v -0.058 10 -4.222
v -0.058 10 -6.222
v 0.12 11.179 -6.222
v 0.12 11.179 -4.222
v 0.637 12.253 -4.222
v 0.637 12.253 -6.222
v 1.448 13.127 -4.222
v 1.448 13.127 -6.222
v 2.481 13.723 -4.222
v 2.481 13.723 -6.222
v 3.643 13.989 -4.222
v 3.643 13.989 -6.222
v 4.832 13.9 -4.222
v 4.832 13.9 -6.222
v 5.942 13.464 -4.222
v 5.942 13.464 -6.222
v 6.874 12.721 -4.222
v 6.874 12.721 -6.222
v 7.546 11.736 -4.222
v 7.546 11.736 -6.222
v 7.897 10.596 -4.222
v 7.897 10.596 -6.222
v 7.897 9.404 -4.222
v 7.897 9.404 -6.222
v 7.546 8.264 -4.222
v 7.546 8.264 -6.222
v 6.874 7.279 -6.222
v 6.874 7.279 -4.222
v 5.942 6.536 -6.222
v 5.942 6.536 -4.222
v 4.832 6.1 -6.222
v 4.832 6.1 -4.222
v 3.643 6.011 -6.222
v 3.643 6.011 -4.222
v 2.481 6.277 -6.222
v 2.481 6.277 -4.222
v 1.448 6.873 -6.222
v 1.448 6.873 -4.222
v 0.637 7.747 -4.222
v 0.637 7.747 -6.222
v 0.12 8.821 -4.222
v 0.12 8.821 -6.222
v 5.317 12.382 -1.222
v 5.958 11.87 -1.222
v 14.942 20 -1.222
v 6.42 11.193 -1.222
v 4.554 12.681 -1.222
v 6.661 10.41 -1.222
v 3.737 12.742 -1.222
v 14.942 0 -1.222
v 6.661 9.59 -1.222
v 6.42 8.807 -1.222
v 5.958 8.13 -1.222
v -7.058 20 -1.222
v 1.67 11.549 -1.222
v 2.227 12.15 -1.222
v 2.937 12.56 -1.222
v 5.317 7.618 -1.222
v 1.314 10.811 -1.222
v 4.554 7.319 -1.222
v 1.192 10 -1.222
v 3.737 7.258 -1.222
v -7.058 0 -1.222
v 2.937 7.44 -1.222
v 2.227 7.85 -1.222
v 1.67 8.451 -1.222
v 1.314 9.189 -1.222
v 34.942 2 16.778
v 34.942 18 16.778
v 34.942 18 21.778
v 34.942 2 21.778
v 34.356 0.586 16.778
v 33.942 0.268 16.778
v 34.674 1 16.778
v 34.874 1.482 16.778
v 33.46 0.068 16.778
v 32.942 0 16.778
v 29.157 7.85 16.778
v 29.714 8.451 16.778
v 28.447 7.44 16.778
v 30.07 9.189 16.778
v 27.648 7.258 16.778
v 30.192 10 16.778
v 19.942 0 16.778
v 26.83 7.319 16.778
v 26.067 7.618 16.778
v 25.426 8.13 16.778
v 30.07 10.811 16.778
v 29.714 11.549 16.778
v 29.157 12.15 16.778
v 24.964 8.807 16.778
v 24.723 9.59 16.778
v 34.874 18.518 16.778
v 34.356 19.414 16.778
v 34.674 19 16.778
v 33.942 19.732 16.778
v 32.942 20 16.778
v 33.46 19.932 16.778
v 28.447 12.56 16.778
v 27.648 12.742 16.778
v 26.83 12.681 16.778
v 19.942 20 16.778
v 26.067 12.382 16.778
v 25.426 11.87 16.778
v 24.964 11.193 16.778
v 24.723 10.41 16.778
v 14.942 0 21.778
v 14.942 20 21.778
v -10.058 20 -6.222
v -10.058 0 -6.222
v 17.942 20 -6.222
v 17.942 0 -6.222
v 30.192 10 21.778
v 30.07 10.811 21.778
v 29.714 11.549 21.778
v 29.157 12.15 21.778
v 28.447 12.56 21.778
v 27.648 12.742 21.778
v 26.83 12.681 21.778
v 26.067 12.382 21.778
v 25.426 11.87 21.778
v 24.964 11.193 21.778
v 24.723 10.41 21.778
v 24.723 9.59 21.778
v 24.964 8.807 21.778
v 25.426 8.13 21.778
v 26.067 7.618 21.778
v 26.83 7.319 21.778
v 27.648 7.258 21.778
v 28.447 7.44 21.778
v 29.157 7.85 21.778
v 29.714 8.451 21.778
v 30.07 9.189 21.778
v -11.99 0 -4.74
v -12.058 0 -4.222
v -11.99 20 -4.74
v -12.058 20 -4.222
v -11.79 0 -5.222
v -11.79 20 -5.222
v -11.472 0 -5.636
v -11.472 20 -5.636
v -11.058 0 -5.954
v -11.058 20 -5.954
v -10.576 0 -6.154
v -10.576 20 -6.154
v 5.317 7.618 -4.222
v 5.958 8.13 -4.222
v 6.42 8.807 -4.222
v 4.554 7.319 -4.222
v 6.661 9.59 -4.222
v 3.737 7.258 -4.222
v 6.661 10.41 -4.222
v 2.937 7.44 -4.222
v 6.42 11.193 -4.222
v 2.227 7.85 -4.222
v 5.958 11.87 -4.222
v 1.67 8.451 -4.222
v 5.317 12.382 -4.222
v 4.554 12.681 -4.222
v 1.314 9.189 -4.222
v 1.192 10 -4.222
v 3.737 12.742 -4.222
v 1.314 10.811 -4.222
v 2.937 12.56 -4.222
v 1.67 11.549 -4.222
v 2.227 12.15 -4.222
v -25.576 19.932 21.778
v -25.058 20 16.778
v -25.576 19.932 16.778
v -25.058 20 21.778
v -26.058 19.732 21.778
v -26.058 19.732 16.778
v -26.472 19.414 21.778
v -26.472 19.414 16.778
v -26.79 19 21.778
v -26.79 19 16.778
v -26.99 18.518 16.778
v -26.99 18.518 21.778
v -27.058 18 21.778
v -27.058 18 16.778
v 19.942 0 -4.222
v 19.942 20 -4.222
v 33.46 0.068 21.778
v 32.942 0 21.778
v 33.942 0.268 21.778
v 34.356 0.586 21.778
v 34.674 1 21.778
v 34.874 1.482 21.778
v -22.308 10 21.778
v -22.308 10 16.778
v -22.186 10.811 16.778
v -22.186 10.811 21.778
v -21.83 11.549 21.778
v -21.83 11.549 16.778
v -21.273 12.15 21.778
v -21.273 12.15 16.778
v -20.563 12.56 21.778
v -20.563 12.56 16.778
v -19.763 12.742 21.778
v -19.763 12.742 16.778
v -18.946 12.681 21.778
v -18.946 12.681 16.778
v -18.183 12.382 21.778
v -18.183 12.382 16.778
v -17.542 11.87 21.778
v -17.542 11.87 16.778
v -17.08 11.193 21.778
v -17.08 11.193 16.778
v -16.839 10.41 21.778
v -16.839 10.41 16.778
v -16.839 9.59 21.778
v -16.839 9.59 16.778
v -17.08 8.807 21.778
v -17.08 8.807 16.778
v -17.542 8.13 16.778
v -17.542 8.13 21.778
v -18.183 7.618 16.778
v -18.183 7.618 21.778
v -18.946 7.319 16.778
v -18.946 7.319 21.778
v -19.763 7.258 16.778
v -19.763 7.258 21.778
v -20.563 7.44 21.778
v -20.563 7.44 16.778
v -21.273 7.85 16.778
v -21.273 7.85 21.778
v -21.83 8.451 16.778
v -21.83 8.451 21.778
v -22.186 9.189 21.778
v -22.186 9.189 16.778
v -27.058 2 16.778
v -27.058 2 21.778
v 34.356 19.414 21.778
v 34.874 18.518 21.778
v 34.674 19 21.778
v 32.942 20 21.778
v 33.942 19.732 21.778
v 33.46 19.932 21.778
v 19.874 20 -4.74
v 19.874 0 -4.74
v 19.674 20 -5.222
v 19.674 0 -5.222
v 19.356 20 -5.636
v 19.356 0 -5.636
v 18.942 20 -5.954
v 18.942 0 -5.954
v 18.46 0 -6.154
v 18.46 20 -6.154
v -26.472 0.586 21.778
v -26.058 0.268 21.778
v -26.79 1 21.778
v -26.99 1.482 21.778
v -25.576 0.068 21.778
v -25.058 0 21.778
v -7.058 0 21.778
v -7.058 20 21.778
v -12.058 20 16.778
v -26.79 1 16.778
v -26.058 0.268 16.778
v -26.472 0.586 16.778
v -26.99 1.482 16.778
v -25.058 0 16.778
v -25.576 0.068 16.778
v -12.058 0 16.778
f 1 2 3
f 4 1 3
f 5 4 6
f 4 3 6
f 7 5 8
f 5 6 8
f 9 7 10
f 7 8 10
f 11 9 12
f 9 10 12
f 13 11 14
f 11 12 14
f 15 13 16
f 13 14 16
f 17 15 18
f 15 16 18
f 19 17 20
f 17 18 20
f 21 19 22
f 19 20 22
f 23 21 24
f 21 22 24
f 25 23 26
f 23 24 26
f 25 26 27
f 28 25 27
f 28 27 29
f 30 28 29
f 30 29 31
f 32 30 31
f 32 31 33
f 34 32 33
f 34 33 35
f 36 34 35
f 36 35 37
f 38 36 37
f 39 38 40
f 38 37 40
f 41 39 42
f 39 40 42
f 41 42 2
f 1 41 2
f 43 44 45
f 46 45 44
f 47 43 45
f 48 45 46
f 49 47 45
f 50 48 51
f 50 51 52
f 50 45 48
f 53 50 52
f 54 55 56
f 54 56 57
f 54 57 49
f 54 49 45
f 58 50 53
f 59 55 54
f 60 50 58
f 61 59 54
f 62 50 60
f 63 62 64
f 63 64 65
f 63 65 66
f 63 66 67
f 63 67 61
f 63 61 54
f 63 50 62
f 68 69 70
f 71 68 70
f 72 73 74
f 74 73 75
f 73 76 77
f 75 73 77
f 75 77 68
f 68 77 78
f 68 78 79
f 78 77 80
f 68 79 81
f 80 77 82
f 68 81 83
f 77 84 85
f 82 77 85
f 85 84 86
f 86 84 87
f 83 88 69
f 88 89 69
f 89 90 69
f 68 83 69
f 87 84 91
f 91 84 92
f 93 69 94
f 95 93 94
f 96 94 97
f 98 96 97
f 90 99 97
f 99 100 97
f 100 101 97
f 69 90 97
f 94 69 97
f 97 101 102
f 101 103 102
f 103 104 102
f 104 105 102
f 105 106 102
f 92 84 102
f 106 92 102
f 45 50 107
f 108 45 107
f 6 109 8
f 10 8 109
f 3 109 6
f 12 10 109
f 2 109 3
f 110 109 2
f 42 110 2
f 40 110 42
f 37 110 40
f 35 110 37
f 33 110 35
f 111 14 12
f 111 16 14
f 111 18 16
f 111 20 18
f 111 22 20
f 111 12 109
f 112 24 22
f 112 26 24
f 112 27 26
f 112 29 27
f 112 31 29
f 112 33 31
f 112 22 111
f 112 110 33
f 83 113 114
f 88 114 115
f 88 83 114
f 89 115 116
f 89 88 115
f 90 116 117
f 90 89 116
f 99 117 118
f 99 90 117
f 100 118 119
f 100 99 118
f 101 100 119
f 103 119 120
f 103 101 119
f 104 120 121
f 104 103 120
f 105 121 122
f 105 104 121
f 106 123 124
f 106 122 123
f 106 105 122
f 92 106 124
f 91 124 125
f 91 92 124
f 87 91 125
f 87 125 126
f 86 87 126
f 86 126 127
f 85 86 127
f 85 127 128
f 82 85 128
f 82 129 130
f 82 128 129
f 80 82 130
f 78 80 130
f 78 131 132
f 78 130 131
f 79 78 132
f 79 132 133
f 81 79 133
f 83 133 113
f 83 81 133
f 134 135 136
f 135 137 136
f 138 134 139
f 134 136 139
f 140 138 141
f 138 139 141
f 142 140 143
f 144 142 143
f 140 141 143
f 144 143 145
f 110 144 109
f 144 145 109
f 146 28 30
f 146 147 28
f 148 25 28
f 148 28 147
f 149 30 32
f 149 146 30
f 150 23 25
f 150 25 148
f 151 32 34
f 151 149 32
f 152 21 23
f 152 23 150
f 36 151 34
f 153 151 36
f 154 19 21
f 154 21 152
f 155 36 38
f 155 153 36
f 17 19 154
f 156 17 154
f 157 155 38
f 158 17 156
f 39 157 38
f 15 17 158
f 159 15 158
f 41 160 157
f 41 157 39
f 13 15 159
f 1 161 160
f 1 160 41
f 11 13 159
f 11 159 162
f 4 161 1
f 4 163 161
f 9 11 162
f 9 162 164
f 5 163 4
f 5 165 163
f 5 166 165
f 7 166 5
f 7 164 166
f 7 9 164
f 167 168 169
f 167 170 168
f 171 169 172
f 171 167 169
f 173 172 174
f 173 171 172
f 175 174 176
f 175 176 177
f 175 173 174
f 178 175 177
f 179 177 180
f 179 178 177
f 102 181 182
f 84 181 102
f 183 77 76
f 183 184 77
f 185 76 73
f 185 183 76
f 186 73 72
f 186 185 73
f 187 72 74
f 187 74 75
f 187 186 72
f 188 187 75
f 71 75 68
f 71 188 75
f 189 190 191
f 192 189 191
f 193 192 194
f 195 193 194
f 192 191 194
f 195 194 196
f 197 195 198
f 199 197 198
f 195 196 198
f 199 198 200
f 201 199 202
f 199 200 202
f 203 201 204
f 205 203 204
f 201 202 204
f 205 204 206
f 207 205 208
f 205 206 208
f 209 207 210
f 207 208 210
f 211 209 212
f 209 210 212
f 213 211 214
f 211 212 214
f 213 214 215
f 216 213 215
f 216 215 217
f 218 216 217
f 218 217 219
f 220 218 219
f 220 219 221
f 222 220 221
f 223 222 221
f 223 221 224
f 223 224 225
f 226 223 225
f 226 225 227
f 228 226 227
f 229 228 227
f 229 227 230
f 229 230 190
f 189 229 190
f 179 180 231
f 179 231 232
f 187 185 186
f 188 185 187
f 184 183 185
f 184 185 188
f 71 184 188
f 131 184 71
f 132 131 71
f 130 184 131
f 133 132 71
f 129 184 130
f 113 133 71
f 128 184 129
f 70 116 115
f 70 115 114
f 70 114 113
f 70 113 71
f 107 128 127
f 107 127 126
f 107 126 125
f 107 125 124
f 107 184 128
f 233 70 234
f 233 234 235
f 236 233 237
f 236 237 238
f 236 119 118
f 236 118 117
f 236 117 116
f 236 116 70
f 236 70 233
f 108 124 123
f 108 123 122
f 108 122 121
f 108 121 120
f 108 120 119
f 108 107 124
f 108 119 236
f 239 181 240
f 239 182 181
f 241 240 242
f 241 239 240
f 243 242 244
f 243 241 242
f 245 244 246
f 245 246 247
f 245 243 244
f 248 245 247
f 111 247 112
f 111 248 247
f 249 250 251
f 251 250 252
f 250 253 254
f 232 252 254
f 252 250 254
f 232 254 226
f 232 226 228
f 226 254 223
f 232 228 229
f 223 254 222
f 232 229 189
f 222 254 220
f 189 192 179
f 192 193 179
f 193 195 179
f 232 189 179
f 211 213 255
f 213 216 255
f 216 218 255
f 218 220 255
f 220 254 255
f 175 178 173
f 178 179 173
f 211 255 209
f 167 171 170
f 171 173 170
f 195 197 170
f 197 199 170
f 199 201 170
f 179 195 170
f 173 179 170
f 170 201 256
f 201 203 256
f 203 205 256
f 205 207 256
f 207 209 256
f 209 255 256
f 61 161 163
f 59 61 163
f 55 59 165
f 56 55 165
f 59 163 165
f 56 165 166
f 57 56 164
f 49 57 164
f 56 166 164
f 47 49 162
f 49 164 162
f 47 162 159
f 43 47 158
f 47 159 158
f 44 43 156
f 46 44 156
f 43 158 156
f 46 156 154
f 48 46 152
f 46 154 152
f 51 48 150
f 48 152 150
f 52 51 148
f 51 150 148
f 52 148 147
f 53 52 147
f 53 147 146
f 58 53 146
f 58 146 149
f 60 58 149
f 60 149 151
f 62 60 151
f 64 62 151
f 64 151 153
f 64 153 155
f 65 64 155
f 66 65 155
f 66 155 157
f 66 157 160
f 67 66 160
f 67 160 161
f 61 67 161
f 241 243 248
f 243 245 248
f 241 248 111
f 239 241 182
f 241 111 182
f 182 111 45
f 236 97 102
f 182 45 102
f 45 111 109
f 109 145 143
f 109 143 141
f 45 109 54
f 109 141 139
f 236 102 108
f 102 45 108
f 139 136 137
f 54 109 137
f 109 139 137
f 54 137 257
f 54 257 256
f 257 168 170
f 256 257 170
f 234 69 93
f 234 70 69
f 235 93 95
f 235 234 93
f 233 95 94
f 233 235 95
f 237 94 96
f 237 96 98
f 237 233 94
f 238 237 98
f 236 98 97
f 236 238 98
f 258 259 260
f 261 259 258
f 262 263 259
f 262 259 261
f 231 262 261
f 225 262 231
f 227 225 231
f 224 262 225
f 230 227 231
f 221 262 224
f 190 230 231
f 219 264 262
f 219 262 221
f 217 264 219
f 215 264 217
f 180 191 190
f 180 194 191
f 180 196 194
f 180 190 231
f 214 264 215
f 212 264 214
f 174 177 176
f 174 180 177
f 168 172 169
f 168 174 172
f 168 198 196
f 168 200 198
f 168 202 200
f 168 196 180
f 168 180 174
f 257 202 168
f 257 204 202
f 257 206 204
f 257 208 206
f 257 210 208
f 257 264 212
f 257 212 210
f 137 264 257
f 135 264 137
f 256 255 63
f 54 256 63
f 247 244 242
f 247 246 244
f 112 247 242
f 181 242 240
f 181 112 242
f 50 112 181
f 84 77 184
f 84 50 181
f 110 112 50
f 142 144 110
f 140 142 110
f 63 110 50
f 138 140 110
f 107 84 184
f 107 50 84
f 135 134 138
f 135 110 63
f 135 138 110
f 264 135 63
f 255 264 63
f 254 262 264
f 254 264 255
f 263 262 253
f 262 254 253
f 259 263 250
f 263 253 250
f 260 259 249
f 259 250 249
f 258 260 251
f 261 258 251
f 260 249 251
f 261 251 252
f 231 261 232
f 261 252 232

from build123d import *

# Parameters (mm, degrees)
EXTRUDE_1_DEPTH     = 20
SKETCH_2_R          = 2.75
CUT_EXTRUDE_1_DEPTH = 40.770397535
SKETCH_3_W          = 5
SKETCH_3_H          = 20
EXTRUDE_2_DEPTH     = 15
SKETCH_4_R          = 2.75
CUT_EXTRUDE_2_DEPTH = 41.757009157
FILLET_1_R          = 2
SKETCH_5_R          = 4
CUT_EXTRUDE_3_DEPTH = 2


with BuildPart() as part:
    # 草图1 → 凸台-拉伸1 (new body)
    with BuildSketch(Plane(origin=(0, 0, 0), x_dir=(1, 0, 0), z_dir=(0, 1, 0))):
        Polygon((-12.057971014, 6.222222222), (19.942028986, 6.222222222), (19.942028986, -21.777777778), (14.942028986, -21.777777778), (14.942028986, -16.777777778), (14.942028986, 1.222222222), (-7.057971014, 1.222222222), (-7.057971014, -16.777777778), (-7.057971014, -21.777777778), (-12.057971014, -21.777777778), align=None)
    extrude(amount=EXTRUDE_1_DEPTH)

    # 草图2 → 切除-拉伸1 (cut, through all)
    with BuildSketch(Plane(origin=(0, 0, -6.222222222), x_dir=(-1, 0, 0), z_dir=(0, 0, -1))):
        with Locations((-3.942028986, 10)):
            Circle(SKETCH_2_R)
    extrude(amount=-CUT_EXTRUDE_1_DEPTH, mode=Mode.SUBTRACT)

    # 草图3 → 凸台-拉伸2 (add)
    with BuildSketch(Plane.ZY.offset(12.057971014)):
        with Locations((19.277777778, 10)):
            Rectangle(SKETCH_3_W, SKETCH_3_H)
    extrude_2 = extrude(amount=EXTRUDE_2_DEPTH)

    # 草图4 → 切除-拉伸2 (cut, through all)
    with BuildSketch(Plane(origin=(0, 0, 16.777777778), x_dir=(-1, 0, 0), z_dir=(0, 0, -1))):
        with Locations((19.557971014, 10)):
            Circle(SKETCH_4_R)
    cut_extrude_2 = extrude(amount=-CUT_EXTRUDE_2_DEPTH, mode=Mode.SUBTRACT)

    # 镜向5: 凸台-拉伸2, 切除-拉伸2 across plane
    add(extrude_2.mirror(Plane.ZY.offset(-3.942028986)))
    add(cut_extrude_2.mirror(Plane.ZY.offset(-3.942028986)), mode=Mode.SUBTRACT)

    # 圆角1
    fillet_1_edges = [part.edges().sort_by_distance(p)[0] for p in [
        (-12.057971014, 10, -6.222222222),
        (19.942028986, 10, -6.222222222),
        (-27.057971014, 0, 19.277777778),
        (-27.057971014, 20, 19.277777778),
        (34.942028986, 0, 19.277777778),
        (34.942028986, 20, 19.277777778),
    ]]
    fillet(fillet_1_edges, radius=FILLET_1_R)

    # 草图5 → 切除-拉伸3 (cut)
    with BuildSketch(Plane(origin=(0, 0, -6.222222222), x_dir=(-1, 0, 0), z_dir=(0, 0, -1))):
        with Locations((-3.942028986, 10)):
            Circle(SKETCH_5_R)
    extrude(amount=-CUT_EXTRUDE_3_DEPTH, mode=Mode.SUBTRACT)


solid = part.part
